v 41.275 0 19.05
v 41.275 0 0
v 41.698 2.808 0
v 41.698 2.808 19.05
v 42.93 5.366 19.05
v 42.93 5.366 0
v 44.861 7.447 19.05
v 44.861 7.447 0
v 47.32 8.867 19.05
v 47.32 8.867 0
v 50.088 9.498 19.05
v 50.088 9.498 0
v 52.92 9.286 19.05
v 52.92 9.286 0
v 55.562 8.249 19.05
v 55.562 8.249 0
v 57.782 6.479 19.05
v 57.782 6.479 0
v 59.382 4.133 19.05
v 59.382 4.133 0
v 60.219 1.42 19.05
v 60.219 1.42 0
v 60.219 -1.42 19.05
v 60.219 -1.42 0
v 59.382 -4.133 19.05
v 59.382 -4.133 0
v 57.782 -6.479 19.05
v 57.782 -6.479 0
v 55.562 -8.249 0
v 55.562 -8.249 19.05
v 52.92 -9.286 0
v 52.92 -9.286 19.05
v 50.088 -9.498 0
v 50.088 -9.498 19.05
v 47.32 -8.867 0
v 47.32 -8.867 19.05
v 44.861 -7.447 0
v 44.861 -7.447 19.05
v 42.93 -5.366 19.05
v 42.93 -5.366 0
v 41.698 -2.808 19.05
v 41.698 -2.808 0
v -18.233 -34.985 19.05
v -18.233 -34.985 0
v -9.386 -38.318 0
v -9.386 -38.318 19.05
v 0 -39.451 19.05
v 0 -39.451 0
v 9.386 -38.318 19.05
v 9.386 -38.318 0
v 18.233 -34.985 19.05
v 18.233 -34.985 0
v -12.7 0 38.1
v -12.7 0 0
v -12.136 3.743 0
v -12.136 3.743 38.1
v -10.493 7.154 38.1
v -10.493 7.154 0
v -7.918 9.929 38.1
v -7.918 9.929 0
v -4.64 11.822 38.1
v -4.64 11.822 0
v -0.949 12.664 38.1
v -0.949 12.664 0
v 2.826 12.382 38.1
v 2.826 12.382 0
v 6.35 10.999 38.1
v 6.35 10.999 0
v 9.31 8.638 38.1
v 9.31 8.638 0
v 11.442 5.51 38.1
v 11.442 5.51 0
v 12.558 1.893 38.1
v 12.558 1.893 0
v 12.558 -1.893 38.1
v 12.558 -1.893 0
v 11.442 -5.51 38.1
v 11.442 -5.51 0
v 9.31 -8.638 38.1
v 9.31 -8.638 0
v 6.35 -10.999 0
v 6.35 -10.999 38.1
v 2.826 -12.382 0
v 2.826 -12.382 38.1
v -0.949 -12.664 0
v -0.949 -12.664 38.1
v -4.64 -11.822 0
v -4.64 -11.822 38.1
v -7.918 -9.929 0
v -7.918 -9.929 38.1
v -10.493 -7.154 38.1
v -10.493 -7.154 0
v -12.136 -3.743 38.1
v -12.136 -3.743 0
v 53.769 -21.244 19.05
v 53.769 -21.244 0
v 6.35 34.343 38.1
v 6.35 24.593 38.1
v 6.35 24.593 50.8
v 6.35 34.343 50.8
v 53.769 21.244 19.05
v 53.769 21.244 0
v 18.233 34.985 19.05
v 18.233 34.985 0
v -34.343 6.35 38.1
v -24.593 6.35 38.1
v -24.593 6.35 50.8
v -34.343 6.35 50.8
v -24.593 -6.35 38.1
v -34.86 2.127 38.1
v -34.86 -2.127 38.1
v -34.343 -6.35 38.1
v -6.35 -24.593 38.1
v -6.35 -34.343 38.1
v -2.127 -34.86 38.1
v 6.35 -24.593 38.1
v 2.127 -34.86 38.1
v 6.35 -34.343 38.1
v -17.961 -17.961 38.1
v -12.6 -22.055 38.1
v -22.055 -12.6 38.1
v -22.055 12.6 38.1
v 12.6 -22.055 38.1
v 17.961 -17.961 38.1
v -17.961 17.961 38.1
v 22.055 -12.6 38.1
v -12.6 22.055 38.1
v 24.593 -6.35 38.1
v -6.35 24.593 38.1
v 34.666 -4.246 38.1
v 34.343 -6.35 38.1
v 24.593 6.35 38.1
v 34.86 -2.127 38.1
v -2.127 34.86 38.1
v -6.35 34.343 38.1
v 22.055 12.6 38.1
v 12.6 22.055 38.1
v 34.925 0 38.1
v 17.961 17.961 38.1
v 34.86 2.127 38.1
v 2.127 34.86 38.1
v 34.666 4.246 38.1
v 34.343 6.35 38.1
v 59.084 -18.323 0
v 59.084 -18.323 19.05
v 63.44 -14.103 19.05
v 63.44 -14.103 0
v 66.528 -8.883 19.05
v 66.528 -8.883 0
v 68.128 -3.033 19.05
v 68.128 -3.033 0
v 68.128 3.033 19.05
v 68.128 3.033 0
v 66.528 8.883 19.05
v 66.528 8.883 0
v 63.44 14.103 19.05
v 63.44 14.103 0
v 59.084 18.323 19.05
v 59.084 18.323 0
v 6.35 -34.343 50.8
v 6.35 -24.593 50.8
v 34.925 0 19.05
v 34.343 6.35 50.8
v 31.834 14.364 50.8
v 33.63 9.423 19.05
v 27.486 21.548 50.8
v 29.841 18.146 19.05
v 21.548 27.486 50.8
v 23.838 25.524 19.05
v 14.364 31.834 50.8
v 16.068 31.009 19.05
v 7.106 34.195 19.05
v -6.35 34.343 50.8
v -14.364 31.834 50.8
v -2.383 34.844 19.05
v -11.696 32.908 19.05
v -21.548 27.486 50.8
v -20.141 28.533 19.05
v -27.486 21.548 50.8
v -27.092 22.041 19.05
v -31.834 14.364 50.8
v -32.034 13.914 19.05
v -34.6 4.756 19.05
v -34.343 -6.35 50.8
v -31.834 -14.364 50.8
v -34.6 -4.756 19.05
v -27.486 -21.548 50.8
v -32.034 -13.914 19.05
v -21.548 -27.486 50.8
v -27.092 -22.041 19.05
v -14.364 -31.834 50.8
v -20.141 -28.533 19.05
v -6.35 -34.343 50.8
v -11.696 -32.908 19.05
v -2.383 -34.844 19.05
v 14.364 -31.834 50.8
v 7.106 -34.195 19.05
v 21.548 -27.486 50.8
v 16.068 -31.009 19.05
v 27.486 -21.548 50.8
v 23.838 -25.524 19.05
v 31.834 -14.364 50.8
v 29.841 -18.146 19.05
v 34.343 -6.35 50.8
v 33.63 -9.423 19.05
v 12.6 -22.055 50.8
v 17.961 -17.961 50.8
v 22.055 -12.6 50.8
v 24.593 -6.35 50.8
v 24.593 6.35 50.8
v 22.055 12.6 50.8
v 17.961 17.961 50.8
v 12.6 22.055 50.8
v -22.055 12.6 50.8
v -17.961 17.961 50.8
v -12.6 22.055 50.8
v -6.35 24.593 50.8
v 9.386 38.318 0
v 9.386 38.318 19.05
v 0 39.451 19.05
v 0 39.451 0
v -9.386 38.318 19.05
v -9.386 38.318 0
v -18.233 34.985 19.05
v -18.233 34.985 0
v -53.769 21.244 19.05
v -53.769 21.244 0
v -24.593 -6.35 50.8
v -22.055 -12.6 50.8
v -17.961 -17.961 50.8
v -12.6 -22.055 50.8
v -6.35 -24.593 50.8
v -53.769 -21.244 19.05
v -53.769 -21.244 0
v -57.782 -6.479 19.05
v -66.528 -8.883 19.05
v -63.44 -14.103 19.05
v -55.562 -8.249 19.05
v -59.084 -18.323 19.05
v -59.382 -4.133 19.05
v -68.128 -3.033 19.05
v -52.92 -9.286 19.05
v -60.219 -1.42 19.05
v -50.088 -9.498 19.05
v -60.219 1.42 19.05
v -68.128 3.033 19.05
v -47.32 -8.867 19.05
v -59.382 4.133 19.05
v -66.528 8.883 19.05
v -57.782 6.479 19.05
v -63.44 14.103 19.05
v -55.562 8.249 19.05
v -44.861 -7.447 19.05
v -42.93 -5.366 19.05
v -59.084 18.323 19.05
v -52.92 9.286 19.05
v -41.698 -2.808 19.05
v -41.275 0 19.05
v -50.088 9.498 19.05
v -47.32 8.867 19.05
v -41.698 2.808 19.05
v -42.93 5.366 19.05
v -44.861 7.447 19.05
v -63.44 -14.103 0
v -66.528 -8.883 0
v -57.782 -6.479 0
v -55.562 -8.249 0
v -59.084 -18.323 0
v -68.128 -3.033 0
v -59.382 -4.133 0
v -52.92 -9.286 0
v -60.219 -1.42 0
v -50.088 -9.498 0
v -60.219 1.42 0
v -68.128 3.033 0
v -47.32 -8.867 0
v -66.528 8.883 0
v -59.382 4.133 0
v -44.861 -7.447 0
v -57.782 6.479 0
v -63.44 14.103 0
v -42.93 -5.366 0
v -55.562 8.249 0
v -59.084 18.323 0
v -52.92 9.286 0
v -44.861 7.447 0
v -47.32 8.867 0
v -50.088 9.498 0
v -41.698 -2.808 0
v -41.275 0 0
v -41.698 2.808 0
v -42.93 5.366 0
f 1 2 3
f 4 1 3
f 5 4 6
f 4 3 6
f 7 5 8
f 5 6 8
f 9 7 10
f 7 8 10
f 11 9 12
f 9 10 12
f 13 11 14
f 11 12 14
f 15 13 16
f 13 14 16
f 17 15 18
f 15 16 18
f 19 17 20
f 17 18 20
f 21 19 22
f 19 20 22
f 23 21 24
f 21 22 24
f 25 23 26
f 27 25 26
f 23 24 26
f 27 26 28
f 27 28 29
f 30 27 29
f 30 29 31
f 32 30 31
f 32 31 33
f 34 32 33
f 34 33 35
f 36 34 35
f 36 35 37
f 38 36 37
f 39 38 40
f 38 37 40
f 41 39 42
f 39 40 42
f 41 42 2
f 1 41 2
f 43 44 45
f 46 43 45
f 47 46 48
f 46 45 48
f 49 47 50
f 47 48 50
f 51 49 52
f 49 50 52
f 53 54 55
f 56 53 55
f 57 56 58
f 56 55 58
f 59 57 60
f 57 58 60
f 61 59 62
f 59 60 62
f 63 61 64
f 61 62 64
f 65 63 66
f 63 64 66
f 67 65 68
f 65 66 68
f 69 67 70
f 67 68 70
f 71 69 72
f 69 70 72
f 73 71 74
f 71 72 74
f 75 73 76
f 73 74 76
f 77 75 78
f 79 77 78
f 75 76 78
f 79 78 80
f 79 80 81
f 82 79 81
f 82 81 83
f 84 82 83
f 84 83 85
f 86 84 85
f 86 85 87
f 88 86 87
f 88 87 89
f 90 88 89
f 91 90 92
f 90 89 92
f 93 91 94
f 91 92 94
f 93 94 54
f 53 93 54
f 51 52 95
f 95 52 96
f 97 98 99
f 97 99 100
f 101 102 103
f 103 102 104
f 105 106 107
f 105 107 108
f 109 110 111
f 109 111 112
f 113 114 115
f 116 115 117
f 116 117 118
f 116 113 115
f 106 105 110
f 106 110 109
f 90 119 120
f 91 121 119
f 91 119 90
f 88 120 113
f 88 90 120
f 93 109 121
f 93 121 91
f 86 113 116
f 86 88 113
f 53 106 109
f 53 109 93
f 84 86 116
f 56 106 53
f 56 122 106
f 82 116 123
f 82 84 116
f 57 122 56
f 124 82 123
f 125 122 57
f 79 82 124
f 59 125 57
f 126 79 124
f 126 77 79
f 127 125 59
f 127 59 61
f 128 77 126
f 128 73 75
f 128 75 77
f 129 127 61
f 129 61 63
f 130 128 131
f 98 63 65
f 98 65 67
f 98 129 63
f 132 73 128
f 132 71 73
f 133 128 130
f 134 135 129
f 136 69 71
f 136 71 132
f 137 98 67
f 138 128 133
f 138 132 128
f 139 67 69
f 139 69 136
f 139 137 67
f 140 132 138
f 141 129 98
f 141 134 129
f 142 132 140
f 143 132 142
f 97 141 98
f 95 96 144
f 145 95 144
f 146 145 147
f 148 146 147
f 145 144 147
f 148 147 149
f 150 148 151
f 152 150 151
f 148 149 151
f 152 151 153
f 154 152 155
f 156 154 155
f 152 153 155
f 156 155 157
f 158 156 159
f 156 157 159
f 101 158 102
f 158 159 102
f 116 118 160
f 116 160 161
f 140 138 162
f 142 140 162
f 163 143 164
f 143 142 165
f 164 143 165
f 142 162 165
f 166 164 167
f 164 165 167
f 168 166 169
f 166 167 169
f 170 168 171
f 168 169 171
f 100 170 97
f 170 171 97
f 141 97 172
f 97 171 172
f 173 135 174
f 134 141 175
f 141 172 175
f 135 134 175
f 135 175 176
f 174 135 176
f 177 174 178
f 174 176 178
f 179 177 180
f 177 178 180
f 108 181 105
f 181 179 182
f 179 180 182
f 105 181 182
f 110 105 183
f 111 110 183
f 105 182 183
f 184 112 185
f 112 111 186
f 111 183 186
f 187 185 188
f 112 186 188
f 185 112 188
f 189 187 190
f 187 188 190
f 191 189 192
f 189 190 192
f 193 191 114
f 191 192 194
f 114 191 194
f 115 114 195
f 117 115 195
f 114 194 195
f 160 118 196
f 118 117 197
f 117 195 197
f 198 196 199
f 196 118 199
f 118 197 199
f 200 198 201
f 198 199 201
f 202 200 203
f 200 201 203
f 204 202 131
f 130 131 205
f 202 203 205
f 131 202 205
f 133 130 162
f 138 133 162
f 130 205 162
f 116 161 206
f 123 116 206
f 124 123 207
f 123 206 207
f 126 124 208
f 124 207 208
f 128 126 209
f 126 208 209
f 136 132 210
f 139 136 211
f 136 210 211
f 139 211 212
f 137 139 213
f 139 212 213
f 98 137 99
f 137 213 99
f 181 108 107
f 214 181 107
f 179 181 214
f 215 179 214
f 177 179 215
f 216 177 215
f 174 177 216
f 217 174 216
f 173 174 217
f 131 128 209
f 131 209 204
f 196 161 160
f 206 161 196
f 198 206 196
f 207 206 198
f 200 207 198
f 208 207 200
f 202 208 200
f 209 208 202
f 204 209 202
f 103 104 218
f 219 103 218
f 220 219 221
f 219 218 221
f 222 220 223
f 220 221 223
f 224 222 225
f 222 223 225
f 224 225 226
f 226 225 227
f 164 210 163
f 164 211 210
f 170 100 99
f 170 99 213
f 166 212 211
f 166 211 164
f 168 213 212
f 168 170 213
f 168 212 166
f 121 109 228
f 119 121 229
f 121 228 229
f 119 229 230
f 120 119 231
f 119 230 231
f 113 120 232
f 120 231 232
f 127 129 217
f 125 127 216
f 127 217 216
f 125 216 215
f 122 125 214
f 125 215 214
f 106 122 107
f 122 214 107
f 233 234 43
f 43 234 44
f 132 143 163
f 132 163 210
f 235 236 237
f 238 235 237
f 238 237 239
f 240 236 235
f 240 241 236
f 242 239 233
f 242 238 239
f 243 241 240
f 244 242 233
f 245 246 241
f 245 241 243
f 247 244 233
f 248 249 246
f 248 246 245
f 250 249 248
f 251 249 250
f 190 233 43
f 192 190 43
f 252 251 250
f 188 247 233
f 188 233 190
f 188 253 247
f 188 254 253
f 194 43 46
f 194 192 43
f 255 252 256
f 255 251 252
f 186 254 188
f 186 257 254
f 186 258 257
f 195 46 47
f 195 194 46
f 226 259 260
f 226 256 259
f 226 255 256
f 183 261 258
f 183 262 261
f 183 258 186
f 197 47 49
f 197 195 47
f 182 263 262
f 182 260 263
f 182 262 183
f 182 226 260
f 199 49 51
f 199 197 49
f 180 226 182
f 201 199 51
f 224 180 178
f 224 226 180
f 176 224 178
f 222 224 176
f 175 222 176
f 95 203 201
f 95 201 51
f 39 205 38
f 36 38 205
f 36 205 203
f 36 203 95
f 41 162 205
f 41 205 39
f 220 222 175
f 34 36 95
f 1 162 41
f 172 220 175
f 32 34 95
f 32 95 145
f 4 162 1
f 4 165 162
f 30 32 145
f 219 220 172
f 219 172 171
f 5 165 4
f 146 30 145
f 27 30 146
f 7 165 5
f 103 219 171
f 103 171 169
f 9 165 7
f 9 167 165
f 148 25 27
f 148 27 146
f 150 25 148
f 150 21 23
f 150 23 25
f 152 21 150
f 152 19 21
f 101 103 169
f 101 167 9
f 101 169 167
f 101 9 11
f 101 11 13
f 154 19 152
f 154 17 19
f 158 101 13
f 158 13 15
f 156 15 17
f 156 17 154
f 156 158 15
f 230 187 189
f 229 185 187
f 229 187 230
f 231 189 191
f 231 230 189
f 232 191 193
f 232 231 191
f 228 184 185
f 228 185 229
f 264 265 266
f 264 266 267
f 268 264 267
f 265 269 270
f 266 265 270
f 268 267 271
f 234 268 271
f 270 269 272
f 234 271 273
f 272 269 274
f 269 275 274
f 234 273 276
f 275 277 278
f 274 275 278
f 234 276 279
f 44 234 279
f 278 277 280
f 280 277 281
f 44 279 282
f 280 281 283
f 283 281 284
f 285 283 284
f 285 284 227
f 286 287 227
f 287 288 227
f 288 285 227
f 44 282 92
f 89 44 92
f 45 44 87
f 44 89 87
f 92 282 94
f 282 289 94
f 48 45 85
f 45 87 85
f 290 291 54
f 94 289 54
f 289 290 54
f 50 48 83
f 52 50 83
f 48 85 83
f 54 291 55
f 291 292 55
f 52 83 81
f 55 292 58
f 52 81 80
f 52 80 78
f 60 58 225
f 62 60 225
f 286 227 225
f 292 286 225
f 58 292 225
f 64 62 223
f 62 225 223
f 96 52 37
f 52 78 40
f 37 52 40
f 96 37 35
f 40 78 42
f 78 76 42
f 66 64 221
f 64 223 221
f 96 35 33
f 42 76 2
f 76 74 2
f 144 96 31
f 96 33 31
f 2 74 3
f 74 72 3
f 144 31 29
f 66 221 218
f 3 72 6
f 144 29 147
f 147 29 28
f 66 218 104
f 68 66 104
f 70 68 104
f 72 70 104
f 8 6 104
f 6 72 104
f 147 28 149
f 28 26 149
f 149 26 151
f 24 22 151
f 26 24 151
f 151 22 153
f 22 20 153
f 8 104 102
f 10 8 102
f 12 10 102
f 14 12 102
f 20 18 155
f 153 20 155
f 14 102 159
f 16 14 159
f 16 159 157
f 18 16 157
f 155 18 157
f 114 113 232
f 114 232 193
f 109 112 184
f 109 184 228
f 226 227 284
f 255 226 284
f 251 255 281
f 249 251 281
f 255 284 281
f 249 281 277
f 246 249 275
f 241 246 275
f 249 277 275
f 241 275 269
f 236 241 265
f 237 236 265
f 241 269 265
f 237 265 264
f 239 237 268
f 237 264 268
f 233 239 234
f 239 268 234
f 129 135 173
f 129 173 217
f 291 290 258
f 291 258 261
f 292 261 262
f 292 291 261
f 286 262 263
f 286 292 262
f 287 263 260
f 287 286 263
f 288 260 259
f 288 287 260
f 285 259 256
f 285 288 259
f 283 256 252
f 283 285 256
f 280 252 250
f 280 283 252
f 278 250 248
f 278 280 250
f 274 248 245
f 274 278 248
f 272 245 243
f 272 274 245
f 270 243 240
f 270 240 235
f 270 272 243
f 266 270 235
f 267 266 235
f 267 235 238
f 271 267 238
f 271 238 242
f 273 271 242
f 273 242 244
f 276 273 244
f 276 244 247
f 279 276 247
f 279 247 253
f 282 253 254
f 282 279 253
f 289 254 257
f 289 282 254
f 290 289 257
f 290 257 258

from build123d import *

# Parameters (mm, degrees)
F1_DEPTH = 19.05
F2_DEPTH = 38.1
F3_R     = 34.925
F3_R_2   = 12.7
F4_DEPTH = 12.7
F6_DEPTH = 12.7
F0_R     = 9.525
F7_DEPTH = 19.05
F8_DEPTH = 103.378
F9_DEPTH = 38.1


# Not quite as in the source:
# - a feature names something its author has since deleted; it is built from what else it names


with BuildPart() as f1:
    # F0 (on Top) → F1 (new body)
    with BuildSketch(Plane.XY):
        with BuildLine():
            ThreePointArc((-34.925, 0), (0, -34.925), (34.925, 0))
            Line((34.925, 0), (25.4, 0))
            ThreePointArc((25.4, 0), (0, -25.4), (-25.4, 0))
            Line((-25.4, 0), (-34.925, 0))
        make_face()
        with BuildLine():
            Line((25.4, 0), (34.925, 0))
            ThreePointArc((34.925, 0), (0, 34.925), (-34.925, 0))
            Line((-34.925, 0), (-25.4, 0))
            ThreePointArc((-25.4, 0), (0, 25.4), (25.4, 0))
        make_face()
    extrude(amount=F1_DEPTH)

    # F0 (on Top) → F2 (join)
    with BuildSketch(Plane.XY):
        with BuildLine():
            ThreePointArc((-34.925, 0), (0, -34.925), (34.925, 0))
            Line((34.925, 0), (25.4, 0))
            ThreePointArc((25.4, 0), (0, -25.4), (-25.4, 0))
            Line((-25.4, 0), (-34.925, 0))
        make_face()
        with BuildLine():
            Line((25.4, 0), (34.925, 0))
            ThreePointArc((34.925, 0), (0, 34.925), (-34.925, 0))
            Line((-34.925, 0), (-25.4, 0))
            ThreePointArc((-25.4, 0), (0, 25.4), (25.4, 0))
        make_face()
        with BuildLine():
            ThreePointArc((-25.4, 0), (0, -25.4), (25.4, 0))
            Line((25.4, 0), (12.7, 0))
            ThreePointArc((12.7, 0), (0, -12.7), (-12.7, 0))
            Line((-12.7, 0), (-25.4, 0))
        make_face()
        with BuildLine():
            Line((12.7, 0), (25.4, 0))
            ThreePointArc((25.4, 0), (0, 25.4), (-25.4, 0))
            Line((-25.4, 0), (-12.7, 0))
            ThreePointArc((-12.7, 0), (0, 12.7), (12.7, 0))
        make_face()
    extrude(amount=F2_DEPTH)

    # F3 (on face) → F4 (join)
    with BuildSketch(Plane.XY.offset(38.1)):
        Circle(F3_R)
        Circle(F3_R_2, mode=Mode.SUBTRACT)
    extrude(amount=F4_DEPTH)

    # F5 (on face) → F6 (cut)
    with BuildSketch(Plane.XY.offset(50.8)):
        with BuildLine():
            ThreePointArc((-24.5934442484, -6.35), (-25.4, 0), (-24.5934442484, 6.35))
            Line((-24.5934442484, 6.35), (-34.3428758988, 6.35))
            ThreePointArc((-34.3428758988, 6.35), (-34.925, 0), (-34.3428758988, -6.35))
            Line((-34.3428758988, -6.35), (-24.5934442484, -6.35))
        make_face()
        with BuildLine():
            Line((6.35, -34.3428758988), (6.35, -24.5934442484))
            ThreePointArc((6.35, -24.5934442484), (0, -25.4), (-6.35, -24.5934442484))
            Line((-6.35, -24.5934442484), (-6.35, -34.3428758988))
            ThreePointArc((-6.35, -34.3428758988), (0, -34.925), (6.35, -34.3428758988))
        make_face()
        with BuildLine():
            Line((34.3428758988, 6.35), (24.5934442484, 6.35))
            ThreePointArc((24.5934442484, 6.35), (25.1975542852, 3.2005090291), (25.4, 0))
            ThreePointArc((25.4, 0), (25.1975542852, -3.2005090291), (24.5934442484, -6.35))
            Line((24.5934442484, -6.35), (34.3428758988, -6.35))
            ThreePointArc((34.3428758988, -6.35), (34.7791644937, -3.1883133656), (34.925, 0))
            ThreePointArc((34.925, 0), (34.7791644937, 3.1883133656), (34.3428758988, 6.35))
        make_face()
        with BuildLine():
            ThreePointArc((-6.35, 24.5934442484), (0, 25.4), (6.35, 24.5934442484))
            Line((6.35, 24.5934442484), (6.35, 34.3428758988))
            ThreePointArc((6.35, 34.3428758988), (0, 34.925), (-6.35, 34.3428758988))
            Line((-6.35, 34.3428758988), (-6.35, 24.5934442484))
        make_face()
    extrude(amount=-F6_DEPTH, mode=Mode.SUBTRACT)

    # F0 (on Top) → F7 (join)
    with BuildSketch(Plane.XY):
        with BuildLine():
            Line((53.7687589873, 21.2442149995), (18.2328532376, 34.9850083733))
            ThreePointArc((18.2328532376, 34.9850083733), (0, 39.4510804423), (-18.2328532376, 34.9850083733))
            Line((-18.2328532376, 34.9850083733), (-53.7687589873, 21.2442149995))
            ThreePointArc((-53.7687589873, 21.2442149995), (-68.3312757395, 0), (-53.7687589873, -21.2442149995))
            Line((-53.7687589873, -21.2442149995), (-18.2328532376, -34.9850083733))
            ThreePointArc((-18.2328532376, -34.9850083733), (0, -39.4510804423), (18.2328532376, -34.9850083733))
            Line((18.2328532376, -34.9850083733), (53.7687589873, -21.2442149995))
            ThreePointArc((53.7687589873, -21.2442149995), (68.3312757395, 0), (53.7687589873, 21.2442149995))
        make_face()
        with Locations((-50.8, 0)):
            Circle(F0_R, mode=Mode.SUBTRACT)
        with BuildLine():
            ThreePointArc((-34.925, 0), (0, 34.925), (34.925, 0))
            ThreePointArc((34.925, 0), (0, -34.925), (-34.925, 0))
        make_face(mode=Mode.SUBTRACT)
        with BuildLine():
            ThreePointArc((60.325, 0), (50.8, -9.525), (41.275, 0))
            ThreePointArc((41.275, 0), (50.8, 9.525), (60.325, 0))
        make_face(mode=Mode.SUBTRACT)
    extrude(amount=F7_DEPTH)

    # F5 (on face) → F8 (cut)
    with BuildSketch(Plane.XY.offset(50.8)):
        with BuildLine():
            Line((6.35, 6.35), (6.35, 0))
            Line((6.35, 0), (6.35, -6.35))
            Line((6.35, -6.35), (24.5934442484, -6.35))
            ThreePointArc((24.5934442484, -6.35), (25.1975542852, -3.2005090291), (25.4, 0))
            ThreePointArc((25.4, 0), (25.1975542852, 3.2005090291), (24.5934442484, 6.35))
            Line((24.5934442484, 6.35), (6.35, 6.35))
        make_face()
        with BuildLine():
            Line((-6.35, -6.35), (-6.35, 0))
            Line((-6.35, 0), (-6.35, 6.35))
            Line((-6.35, 6.35), (-24.5934442484, 6.35))
            ThreePointArc((-24.5934442484, 6.35), (-25.4, 0), (-24.5934442484, -6.35))
            Line((-24.5934442484, -6.35), (-6.35, -6.35))
        make_face()
        with BuildLine():
            Line((-6.35, 6.35), (0, 6.35))
            Line((0, 6.35), (6.35, 6.35))
            Line((6.35, 6.35), (6.35, 24.5934442484))
            ThreePointArc((6.35, 24.5934442484), (0, 25.4), (-6.35, 24.5934442484))
            Line((-6.35, 24.5934442484), (-6.35, 6.35))
        make_face()
        with BuildLine():
            Line((6.35, -6.35), (0, -6.35))
            Line((0, -6.35), (-6.35, -6.35))
            Line((-6.35, -6.35), (-6.35, -24.5934442484))
            ThreePointArc((-6.35, -24.5934442484), (0, -25.4), (6.35, -24.5934442484))
            Line((6.35, -24.5934442484), (6.35, -6.35))
        make_face()
        with BuildLine():
            Line((6.35, 24.5934442484), (6.35, 6.35))
            Line((6.35, 6.35), (24.5934442484, 6.35))
            ThreePointArc((24.5934442484, 6.35), (17.9605122421, 17.9605122421), (6.35, 24.5934442484))
        make_face()
        with BuildLine():
            Line((24.5934442484, -6.35), (6.35, -6.35))
            Line((6.35, -6.35), (6.35, -24.5934442484))
            ThreePointArc((6.35, -24.5934442484), (17.9605122421, -17.9605122421), (24.5934442484, -6.35))
        make_face()
        with BuildLine():
            Line((-24.5934442484, 6.35), (-6.35, 6.35))
            Line((-6.35, 6.35), (-6.35, 24.5934442484))
            ThreePointArc((-6.35, 24.5934442484), (-17.9605122421, 17.9605122421), (-24.5934442484, 6.35))
        make_face()
        with BuildLine():
            Line((-6.35, -24.5934442484), (-6.35, -6.35))
            Line((-6.35, -6.35), (-24.5934442484, -6.35))
            ThreePointArc((-24.5934442484, -6.35), (-17.9605122421, -17.9605122421), (-6.35, -24.5934442484))
        make_face()
    extrude(amount=-F8_DEPTH, mode=Mode.SUBTRACT)

    # F0 (on Top) → F9 (join)
    with BuildSketch(Plane.XY):
        with BuildLine():
            ThreePointArc((-25.4, 0), (0, -25.4), (25.4, 0))
            Line((25.4, 0), (12.7, 0))
            ThreePointArc((12.7, 0), (0, -12.7), (-12.7, 0))
            Line((-12.7, 0), (-25.4, 0))
        make_face()
        with BuildLine():
            Line((12.7, 0), (25.4, 0))
            ThreePointArc((25.4, 0), (0, 25.4), (-25.4, 0))
            Line((-25.4, 0), (-12.7, 0))
            ThreePointArc((-12.7, 0), (0, 12.7), (12.7, 0))
        make_face()
    extrude(amount=F9_DEPTH)


solid = f1.part
